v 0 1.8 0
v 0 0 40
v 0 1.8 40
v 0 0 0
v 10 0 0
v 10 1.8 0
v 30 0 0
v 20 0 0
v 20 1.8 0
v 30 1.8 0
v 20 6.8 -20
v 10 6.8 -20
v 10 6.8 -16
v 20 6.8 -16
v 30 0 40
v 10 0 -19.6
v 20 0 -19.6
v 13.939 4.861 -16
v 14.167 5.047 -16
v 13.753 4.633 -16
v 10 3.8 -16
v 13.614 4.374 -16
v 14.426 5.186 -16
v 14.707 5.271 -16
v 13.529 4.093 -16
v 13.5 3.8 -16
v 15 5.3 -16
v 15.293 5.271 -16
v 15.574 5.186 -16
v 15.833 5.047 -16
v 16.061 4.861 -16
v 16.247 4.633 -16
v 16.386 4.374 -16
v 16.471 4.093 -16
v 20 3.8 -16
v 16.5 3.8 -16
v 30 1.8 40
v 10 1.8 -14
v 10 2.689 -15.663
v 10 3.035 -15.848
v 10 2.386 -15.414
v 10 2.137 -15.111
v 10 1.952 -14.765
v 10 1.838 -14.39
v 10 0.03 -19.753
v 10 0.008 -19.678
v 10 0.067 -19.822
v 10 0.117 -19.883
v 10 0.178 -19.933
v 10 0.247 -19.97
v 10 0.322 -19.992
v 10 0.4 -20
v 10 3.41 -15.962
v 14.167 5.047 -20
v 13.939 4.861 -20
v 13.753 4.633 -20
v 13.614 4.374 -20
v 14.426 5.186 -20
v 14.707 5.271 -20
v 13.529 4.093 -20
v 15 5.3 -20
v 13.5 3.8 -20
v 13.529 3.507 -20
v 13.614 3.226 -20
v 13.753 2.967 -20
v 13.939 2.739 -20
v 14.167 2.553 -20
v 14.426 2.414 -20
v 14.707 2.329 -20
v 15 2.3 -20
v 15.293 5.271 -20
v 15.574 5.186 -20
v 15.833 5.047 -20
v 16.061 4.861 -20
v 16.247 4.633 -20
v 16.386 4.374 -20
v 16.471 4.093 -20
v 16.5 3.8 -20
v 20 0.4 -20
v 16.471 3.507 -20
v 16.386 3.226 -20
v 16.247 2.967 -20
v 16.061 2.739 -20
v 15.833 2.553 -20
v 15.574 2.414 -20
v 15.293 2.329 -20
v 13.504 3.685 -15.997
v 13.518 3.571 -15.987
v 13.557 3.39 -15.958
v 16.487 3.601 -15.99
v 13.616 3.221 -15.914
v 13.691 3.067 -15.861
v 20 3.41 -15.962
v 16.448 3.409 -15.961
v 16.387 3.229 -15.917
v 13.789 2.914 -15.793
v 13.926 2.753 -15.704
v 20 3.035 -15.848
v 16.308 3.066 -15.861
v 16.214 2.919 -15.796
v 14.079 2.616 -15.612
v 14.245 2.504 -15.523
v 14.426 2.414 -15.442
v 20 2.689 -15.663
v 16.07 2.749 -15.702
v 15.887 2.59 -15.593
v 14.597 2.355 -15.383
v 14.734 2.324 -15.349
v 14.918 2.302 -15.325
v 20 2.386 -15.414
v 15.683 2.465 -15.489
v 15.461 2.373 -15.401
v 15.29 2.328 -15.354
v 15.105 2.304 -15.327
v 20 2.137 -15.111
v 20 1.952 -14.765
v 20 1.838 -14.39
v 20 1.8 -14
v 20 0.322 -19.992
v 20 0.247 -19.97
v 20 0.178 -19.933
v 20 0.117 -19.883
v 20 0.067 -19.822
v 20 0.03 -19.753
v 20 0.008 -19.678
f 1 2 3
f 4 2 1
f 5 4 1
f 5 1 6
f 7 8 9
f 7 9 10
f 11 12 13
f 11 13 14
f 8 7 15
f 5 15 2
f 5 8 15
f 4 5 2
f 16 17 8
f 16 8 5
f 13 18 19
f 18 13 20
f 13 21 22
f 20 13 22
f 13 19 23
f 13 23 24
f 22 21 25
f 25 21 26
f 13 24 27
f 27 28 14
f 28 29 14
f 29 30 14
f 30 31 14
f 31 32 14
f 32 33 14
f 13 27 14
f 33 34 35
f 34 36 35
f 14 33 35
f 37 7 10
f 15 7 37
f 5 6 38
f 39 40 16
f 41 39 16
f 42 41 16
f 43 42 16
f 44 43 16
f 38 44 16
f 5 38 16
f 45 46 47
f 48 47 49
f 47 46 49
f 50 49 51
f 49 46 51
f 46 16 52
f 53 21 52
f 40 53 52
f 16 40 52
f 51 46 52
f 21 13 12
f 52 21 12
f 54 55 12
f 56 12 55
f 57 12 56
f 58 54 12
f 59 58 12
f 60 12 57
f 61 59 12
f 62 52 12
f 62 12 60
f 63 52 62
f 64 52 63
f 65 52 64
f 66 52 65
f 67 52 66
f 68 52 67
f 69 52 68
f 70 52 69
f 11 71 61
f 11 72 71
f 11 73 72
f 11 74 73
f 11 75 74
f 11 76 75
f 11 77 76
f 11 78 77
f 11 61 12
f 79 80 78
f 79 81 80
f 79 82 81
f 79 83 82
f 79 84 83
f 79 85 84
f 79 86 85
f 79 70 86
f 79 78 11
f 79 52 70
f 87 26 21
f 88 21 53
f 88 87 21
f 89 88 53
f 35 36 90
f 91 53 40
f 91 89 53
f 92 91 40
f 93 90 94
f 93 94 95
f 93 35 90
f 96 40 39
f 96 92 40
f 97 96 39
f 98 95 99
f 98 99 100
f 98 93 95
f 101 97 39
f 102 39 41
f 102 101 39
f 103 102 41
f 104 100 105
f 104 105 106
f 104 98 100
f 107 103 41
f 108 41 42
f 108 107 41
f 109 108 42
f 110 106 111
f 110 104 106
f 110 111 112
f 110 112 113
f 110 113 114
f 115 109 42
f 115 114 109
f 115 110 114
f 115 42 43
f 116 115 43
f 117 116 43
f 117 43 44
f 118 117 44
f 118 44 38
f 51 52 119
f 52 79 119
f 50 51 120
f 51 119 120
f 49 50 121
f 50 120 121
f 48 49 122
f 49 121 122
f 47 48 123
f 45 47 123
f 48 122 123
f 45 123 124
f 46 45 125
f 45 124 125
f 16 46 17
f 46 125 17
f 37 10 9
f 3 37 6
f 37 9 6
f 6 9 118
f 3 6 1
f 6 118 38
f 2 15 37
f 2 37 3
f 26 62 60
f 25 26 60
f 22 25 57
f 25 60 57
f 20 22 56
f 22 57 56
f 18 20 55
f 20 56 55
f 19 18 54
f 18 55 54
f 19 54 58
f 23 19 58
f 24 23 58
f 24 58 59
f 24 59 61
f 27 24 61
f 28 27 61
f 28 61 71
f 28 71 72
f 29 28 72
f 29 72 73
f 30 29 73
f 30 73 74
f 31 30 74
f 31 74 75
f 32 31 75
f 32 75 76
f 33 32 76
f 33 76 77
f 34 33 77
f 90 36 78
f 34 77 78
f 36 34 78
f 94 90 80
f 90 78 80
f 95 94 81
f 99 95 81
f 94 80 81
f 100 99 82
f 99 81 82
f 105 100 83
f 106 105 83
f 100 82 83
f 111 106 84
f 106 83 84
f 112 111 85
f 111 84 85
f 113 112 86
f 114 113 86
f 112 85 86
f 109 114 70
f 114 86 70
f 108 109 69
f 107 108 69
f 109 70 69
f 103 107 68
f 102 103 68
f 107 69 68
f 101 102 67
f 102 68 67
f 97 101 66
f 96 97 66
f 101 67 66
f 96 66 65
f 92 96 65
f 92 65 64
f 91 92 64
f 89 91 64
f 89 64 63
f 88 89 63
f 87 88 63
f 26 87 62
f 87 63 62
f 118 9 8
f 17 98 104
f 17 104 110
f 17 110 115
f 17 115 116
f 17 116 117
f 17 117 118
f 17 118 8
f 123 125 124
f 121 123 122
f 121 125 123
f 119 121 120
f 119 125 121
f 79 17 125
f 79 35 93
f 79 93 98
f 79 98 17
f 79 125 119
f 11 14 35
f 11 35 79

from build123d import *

# Parameters (mm, degrees)
BOSS_EXTRUDE1_DEPTH = 1.8
SKETCH2_W           = 10
SKETCH2_H           = 4
BOSS_EXTRUDE2_DEPTH = 5
SKETCH3_R           = 1.5
CUT_EXTRUDE1_DEPTH  = 5
FILLET1_R           = 2
FILLET2_R           = 0.4


with BuildPart() as part:
    # Sketch1 → Boss-Extrude1 (new body)
    with BuildSketch(Plane(origin=(0, 0, 0), x_dir=(1, 0, 0), z_dir=(0, 1, 0))):
        Polygon((20, 0), (30, 0), (30, -40), (0, -40), (0, 0), (10, 0), (10, 20), (20, 20), align=None)
    extrude(amount=BOSS_EXTRUDE1_DEPTH)

    # Sketch2 → Boss-Extrude2 (add)
    with BuildSketch(Plane(origin=(0, 1.8, 0), x_dir=(1, 0, 0), z_dir=(0, 1, 0))):
        with Locations((15, 18)):
            Rectangle(SKETCH2_W, SKETCH2_H)
    extrude(amount=BOSS_EXTRUDE2_DEPTH)

    # Sketch3 → Cut-Extrude1 (cut)
    with BuildSketch(Plane(origin=(0, 0, -20), x_dir=(-1, 0, 0), z_dir=(0, 0, -1))):
        with Locations((-15, 3.8)):
            Circle(SKETCH3_R)
    extrude(amount=-CUT_EXTRUDE1_DEPTH, mode=Mode.SUBTRACT)

    # Fillet1
    # the kernel refuses this fillet: 2 mm, written as the material it adds along each edge
    with BuildSketch(Plane(origin=(20, 1.8, -16), x_dir=(0, 0, 1), z_dir=(-1, 0, 0))) as fillet1_piece_1_section:
        with BuildLine():
            CenterArc((FILLET1_R, FILLET1_R), FILLET1_R, 180, 90)
            Line((0, FILLET1_R), (0, 0))
            Line((0, 0), (FILLET1_R, 0))
        make_face()
    fillet1_piece_1 = extrude(amount=10, mode=Mode.PRIVATE)
    fillet1_piece_1 = fillet1_piece_1 - Plane(origin=(15, 3.8, -15.523581598), x_dir=(-1, 0, 0), z_dir=(0, 0, -1)) * Cylinder(1.5, 28, mode=Mode.PRIVATE)
    add(fillet1_piece_1)

    # Fillet2
    fillet2_edges = [part.edges().sort_by_distance(p)[0] for p in [
        (15, 0, -20),
    ]]
    fillet(fillet2_edges, radius=FILLET2_R)


solid = part.part
